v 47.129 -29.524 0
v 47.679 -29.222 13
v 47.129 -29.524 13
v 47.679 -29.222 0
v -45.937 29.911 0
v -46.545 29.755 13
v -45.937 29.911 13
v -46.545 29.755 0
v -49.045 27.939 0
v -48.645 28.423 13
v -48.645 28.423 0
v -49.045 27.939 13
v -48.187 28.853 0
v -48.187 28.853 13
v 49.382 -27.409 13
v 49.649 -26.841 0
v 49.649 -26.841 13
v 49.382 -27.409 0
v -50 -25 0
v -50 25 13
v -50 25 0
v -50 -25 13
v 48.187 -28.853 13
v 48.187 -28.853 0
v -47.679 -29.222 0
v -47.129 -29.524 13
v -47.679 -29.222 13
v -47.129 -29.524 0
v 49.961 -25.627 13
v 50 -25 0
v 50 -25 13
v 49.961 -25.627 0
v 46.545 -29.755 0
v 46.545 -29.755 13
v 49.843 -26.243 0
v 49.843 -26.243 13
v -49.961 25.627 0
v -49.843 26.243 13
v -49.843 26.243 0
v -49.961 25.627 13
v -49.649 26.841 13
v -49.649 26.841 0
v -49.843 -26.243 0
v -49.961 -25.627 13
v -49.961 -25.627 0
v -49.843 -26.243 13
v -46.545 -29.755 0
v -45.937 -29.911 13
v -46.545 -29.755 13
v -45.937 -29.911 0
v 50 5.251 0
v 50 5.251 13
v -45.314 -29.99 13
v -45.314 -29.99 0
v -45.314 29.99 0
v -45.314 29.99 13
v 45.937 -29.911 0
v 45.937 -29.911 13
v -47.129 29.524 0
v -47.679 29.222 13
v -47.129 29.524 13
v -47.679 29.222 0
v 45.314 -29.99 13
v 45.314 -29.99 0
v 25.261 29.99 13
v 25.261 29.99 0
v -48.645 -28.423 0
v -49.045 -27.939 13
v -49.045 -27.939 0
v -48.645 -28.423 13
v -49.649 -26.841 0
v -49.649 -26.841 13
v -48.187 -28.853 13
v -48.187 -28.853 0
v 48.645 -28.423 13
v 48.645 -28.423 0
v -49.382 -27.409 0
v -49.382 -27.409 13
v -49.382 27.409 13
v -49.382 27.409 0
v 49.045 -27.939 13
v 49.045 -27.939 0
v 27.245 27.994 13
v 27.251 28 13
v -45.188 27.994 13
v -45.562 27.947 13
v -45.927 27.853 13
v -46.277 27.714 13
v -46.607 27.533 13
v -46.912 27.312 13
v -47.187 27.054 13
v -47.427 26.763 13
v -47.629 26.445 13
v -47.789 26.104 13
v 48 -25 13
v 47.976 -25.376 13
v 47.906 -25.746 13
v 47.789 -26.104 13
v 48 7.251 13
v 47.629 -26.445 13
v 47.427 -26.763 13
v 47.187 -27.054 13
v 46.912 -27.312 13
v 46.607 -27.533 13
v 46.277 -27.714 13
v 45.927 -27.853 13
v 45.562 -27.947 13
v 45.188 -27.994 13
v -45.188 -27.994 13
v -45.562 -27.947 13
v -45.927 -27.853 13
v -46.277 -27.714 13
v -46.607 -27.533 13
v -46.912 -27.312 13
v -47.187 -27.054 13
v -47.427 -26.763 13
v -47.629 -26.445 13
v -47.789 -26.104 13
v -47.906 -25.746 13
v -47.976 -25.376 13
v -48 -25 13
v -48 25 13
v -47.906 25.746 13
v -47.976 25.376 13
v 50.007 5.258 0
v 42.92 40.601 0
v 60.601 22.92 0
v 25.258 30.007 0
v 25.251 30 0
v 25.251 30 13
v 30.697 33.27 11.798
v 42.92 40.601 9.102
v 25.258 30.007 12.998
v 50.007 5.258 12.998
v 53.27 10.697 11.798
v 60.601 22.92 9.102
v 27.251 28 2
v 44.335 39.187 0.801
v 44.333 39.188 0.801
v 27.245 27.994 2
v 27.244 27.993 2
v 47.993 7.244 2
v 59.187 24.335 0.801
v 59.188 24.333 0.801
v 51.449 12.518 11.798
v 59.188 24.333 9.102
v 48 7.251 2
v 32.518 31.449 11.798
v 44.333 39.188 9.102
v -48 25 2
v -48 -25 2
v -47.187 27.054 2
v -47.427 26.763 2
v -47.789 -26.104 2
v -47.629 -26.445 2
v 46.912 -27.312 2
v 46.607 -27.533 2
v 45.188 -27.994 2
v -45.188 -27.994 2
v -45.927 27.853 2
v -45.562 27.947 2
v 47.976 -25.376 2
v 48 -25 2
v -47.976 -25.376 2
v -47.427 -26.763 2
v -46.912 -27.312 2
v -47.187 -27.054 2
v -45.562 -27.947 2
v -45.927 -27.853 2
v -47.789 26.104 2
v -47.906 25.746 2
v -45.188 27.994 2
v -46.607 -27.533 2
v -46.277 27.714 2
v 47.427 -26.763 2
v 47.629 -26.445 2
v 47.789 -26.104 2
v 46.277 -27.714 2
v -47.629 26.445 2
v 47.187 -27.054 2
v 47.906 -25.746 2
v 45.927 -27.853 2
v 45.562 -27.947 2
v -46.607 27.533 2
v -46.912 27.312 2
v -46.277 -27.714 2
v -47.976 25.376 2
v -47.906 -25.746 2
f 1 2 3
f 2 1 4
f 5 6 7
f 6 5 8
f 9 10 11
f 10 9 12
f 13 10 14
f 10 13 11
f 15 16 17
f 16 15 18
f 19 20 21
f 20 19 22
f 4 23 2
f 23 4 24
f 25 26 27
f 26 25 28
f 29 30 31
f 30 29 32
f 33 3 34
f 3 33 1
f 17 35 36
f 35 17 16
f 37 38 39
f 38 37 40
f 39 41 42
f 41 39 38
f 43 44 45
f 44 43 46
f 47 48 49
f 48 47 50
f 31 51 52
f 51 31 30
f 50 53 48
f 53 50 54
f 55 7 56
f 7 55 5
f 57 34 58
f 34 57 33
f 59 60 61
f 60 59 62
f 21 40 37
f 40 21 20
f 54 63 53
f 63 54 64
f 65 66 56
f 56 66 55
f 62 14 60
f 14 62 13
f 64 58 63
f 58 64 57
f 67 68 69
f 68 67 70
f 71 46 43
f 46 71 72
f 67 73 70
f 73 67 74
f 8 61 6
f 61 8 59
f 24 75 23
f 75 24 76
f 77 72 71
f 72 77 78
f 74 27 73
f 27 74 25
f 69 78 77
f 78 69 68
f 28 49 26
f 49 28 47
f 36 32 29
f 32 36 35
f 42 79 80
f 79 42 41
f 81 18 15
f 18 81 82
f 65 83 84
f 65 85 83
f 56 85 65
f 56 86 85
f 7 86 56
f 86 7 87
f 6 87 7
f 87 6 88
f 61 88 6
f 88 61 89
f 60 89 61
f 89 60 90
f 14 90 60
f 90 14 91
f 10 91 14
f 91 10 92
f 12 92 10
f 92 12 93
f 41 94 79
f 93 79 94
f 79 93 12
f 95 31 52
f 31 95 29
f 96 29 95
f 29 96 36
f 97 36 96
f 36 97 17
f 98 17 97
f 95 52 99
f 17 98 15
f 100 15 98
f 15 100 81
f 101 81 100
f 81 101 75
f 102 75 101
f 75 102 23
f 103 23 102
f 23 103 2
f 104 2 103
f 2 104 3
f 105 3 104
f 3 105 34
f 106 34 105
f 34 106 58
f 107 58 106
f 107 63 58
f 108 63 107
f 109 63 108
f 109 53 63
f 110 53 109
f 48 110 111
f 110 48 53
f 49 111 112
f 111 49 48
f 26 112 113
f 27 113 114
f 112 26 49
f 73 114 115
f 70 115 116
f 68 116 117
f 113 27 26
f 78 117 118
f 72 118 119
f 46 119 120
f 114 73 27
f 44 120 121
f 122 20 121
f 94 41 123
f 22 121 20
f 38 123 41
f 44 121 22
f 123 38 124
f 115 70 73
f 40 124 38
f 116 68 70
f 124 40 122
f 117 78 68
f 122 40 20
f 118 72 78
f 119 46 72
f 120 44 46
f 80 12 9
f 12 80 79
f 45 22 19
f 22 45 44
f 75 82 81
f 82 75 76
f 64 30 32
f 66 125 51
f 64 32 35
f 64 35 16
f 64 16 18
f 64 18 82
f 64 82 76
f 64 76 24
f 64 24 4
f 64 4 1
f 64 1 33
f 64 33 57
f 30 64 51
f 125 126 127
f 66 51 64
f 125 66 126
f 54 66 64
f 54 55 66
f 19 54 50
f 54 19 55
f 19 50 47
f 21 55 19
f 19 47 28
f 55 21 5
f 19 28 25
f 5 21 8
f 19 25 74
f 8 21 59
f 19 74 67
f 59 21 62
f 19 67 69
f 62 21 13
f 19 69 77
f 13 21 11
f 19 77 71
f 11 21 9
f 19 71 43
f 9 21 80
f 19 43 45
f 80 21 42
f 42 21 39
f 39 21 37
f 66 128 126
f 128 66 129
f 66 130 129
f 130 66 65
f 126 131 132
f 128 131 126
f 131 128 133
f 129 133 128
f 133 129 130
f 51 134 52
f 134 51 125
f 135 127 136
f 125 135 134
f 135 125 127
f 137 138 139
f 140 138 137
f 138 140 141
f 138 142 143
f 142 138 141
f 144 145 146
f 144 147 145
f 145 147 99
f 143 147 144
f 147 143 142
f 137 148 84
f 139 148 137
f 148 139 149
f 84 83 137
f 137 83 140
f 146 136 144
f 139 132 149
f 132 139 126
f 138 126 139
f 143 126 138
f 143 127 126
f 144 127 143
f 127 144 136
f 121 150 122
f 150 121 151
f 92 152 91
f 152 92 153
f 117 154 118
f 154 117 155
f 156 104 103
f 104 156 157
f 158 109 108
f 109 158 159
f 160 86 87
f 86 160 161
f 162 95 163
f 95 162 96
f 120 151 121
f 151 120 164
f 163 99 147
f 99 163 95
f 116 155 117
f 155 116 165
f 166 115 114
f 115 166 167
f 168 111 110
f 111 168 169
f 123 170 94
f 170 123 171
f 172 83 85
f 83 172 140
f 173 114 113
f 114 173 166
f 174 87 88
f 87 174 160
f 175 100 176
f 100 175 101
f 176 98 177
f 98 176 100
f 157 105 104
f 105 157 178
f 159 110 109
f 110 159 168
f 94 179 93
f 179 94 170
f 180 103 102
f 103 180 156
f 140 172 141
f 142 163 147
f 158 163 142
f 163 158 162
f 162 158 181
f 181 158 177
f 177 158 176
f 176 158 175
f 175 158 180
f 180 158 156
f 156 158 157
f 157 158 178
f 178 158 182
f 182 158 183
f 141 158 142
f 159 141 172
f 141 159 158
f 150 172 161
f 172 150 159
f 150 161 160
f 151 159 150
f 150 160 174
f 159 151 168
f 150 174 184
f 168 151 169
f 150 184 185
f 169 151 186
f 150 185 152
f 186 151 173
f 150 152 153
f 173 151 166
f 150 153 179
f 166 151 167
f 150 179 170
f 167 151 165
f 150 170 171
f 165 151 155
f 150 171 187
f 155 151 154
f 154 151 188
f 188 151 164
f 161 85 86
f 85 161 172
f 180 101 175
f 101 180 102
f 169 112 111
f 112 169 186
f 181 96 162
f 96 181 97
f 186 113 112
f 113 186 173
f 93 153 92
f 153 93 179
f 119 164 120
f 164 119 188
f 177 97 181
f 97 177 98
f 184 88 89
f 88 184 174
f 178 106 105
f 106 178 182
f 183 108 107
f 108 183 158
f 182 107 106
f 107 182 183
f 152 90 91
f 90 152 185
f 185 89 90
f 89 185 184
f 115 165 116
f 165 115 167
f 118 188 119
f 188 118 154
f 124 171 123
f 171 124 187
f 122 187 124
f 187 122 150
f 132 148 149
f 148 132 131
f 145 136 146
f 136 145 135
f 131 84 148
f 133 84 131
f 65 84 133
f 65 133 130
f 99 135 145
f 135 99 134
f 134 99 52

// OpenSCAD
// Tray external width.
width = 60;

// Tray external length.
length = 100;

// Tray external height.
height = 13;

// Tray corner radius
corner_radius = 5;

// Thickness of wall around the tray
wall_thickness = 2;

// Thickness of the base
base_thickness = 2;

// Spout width at the tray end.
spout_base_width = 35;

// Spout width at the outer end.
spout_tip_width = 25;

// Spout end height as a fraction of the tray wall height.
spout_tip_height_fraction = 0.7;

// Base thickness at the outer end of the spout.
spout_tip_base_thickness = 0.8;

// Controls spout length. Tweak to get desired spout length. 
spout_length_control = 20;

// 0 for right handed, 1 for left handed.
left_hand = 0;  

// Circle smoothness (number of faces).
$fn = 50;

spout_vertical_angle = max(0, atan((height - height * spout_tip_height_fraction)/ spout_length_control));

// Adding '0' to hide in thingiverse customizer.
eps1 = 0.01 + 0;
eps2 = 2 * eps1;


module rounder_cube(w, l, h, r) {
    dx = l/2-r;
    dy = w/2-r;
  hull() {
      translate([dx, dy, 0]) cylinder(r=r, h=h);
      translate([dx, -dy, 0]) cylinder(r=r, h=h);
      translate([-dx, dy, 0]) cylinder(r=r, h=h);
      translate([-dx, -dy, 0]) cylinder(r=r, h=h);
  }
}

module spout() {
  hull() {
    translate([0, -spout_base_width/2, 0]) cube([eps1, spout_base_width, height]);
    translate([spout_length_control-eps1, -spout_tip_width/2, 0]) cube([eps1, spout_tip_width, height]);
  }
}

module spout_slot() {
  hull() {
    translate([-eps1, -(spout_base_width-sqrt(2)*2*wall_thickness)/2, base_thickness]) 
      cube([eps1, spout_base_width-sqrt(2)*2*wall_thickness, height]);
      
    translate([spout_length_control, -(spout_tip_width-2*wall_thickness)/2, spout_tip_base_thickness]) cube([eps1, spout_tip_width-2*wall_thickness, height]);
  }
  
  // Extra cut in case the spout end include the tray's missing 
  // corner so we don't have a leftover from that corner.
  translate([spout_length_control - eps1, -width, -height]) cube([width, 2*width, 3*height]);
}


module main() {
  mirror([left_hand, 0, 0])
  difference() {
     union() {
          //bowel();
               rounder_cube(width, length, height, corner_radius);

          translate([
            length/2-(spout_base_width/2)/sqrt(2), 
            width/2-(spout_base_width/2)/sqrt(2), 
            0]) 
                rotate([0, 0, 45]) spout();
     }
     
     translate([0, 0, base_thickness]) 
     rounder_cube(width-2*wall_thickness, length-2*wall_thickness, height-base_thickness+eps1, max(0.1, corner_radius-wall_thickness));
     
     translate([
            length/2-(spout_base_width/2)/sqrt(2), 
            width/2-(spout_base_width/2)/sqrt(2), 
            0]) 
                rotate([0, 0, 45]) spout_slot();
     
     translate([
         length/2-(spout_base_width/2)/sqrt(2), 
         width/2-(spout_base_width/2)/sqrt(2), 
         height])  
       rotate([0, 0, 45]) 
       rotate([0, spout_vertical_angle, 0]) 
       cylinder(d=2*length, h=height);
 }
     
}

//spout_slot();



main();
